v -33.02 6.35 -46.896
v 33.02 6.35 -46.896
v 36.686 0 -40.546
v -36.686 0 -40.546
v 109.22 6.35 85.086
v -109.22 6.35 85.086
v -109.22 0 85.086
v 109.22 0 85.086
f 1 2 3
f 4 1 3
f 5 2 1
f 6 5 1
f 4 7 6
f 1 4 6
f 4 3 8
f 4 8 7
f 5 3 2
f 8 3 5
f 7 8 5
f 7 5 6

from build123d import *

# Parameters (mm, degrees)
BOSS_EXTRUDE1_DEPTH            = 6.35
CUT_EXTRUDE1_REACH             = 111.22
CUT_EXTRUDE1_DIRECTION_2_REACH = 111.22


with BuildPart() as part:
    # Sketch2 → Boss-Extrude1 (new body)
    with BuildSketch(Plane(origin=(0, 0, 0), x_dir=(1, 0, 0), z_dir=(0, 1, 0))):
        Polygon((-109.22, -85.086141102), (-33.02, 46.896130435), (33.02, 46.896130435), (109.22, -85.086141102), align=None)
    extrude(amount=BOSS_EXTRUDE1_DEPTH)

    # Sketch4 → Cut-Extrude1 (cut, up to next)
    with BuildSketch(Plane(origin=(0, 0, 0), x_dir=(0, 0, -1), z_dir=(1, 0, 0)), mode=Mode.PRIVATE) as cut_extrude1_sk1:
        Polygon((46.896130435, 6.35), (40.546130435, 0), (46.896130435, 0), align=None)
    cut_extrude1_tool1 = extrude(cut_extrude1_sk1.sketch, amount=-CUT_EXTRUDE1_REACH, mode=Mode.PRIVATE) & part.part
    add(cut_extrude1_tool1.solids().sort_by_distance((0, 2.116667, -44.779464))[0], mode=Mode.SUBTRACT)

    # Sketch4 → Cut-Extrude1 direction 2 (cut, up to next)
    with BuildSketch(Plane(origin=(0, 0, 0), x_dir=(0, 0, -1), z_dir=(1, 0, 0)), mode=Mode.PRIVATE) as cut_extrude1_direction_2_sk1:
        Polygon((46.896130435, 6.35), (40.546130435, 0), (46.896130435, 0), align=None)
    cut_extrude1_direction_2_tool1 = extrude(cut_extrude1_direction_2_sk1.sketch, amount=CUT_EXTRUDE1_DIRECTION_2_REACH, mode=Mode.PRIVATE) & part.part
    add(cut_extrude1_direction_2_tool1.solids().sort_by_distance((0, 2.116667, -44.779464))[0], mode=Mode.SUBTRACT)


solid = part.part
